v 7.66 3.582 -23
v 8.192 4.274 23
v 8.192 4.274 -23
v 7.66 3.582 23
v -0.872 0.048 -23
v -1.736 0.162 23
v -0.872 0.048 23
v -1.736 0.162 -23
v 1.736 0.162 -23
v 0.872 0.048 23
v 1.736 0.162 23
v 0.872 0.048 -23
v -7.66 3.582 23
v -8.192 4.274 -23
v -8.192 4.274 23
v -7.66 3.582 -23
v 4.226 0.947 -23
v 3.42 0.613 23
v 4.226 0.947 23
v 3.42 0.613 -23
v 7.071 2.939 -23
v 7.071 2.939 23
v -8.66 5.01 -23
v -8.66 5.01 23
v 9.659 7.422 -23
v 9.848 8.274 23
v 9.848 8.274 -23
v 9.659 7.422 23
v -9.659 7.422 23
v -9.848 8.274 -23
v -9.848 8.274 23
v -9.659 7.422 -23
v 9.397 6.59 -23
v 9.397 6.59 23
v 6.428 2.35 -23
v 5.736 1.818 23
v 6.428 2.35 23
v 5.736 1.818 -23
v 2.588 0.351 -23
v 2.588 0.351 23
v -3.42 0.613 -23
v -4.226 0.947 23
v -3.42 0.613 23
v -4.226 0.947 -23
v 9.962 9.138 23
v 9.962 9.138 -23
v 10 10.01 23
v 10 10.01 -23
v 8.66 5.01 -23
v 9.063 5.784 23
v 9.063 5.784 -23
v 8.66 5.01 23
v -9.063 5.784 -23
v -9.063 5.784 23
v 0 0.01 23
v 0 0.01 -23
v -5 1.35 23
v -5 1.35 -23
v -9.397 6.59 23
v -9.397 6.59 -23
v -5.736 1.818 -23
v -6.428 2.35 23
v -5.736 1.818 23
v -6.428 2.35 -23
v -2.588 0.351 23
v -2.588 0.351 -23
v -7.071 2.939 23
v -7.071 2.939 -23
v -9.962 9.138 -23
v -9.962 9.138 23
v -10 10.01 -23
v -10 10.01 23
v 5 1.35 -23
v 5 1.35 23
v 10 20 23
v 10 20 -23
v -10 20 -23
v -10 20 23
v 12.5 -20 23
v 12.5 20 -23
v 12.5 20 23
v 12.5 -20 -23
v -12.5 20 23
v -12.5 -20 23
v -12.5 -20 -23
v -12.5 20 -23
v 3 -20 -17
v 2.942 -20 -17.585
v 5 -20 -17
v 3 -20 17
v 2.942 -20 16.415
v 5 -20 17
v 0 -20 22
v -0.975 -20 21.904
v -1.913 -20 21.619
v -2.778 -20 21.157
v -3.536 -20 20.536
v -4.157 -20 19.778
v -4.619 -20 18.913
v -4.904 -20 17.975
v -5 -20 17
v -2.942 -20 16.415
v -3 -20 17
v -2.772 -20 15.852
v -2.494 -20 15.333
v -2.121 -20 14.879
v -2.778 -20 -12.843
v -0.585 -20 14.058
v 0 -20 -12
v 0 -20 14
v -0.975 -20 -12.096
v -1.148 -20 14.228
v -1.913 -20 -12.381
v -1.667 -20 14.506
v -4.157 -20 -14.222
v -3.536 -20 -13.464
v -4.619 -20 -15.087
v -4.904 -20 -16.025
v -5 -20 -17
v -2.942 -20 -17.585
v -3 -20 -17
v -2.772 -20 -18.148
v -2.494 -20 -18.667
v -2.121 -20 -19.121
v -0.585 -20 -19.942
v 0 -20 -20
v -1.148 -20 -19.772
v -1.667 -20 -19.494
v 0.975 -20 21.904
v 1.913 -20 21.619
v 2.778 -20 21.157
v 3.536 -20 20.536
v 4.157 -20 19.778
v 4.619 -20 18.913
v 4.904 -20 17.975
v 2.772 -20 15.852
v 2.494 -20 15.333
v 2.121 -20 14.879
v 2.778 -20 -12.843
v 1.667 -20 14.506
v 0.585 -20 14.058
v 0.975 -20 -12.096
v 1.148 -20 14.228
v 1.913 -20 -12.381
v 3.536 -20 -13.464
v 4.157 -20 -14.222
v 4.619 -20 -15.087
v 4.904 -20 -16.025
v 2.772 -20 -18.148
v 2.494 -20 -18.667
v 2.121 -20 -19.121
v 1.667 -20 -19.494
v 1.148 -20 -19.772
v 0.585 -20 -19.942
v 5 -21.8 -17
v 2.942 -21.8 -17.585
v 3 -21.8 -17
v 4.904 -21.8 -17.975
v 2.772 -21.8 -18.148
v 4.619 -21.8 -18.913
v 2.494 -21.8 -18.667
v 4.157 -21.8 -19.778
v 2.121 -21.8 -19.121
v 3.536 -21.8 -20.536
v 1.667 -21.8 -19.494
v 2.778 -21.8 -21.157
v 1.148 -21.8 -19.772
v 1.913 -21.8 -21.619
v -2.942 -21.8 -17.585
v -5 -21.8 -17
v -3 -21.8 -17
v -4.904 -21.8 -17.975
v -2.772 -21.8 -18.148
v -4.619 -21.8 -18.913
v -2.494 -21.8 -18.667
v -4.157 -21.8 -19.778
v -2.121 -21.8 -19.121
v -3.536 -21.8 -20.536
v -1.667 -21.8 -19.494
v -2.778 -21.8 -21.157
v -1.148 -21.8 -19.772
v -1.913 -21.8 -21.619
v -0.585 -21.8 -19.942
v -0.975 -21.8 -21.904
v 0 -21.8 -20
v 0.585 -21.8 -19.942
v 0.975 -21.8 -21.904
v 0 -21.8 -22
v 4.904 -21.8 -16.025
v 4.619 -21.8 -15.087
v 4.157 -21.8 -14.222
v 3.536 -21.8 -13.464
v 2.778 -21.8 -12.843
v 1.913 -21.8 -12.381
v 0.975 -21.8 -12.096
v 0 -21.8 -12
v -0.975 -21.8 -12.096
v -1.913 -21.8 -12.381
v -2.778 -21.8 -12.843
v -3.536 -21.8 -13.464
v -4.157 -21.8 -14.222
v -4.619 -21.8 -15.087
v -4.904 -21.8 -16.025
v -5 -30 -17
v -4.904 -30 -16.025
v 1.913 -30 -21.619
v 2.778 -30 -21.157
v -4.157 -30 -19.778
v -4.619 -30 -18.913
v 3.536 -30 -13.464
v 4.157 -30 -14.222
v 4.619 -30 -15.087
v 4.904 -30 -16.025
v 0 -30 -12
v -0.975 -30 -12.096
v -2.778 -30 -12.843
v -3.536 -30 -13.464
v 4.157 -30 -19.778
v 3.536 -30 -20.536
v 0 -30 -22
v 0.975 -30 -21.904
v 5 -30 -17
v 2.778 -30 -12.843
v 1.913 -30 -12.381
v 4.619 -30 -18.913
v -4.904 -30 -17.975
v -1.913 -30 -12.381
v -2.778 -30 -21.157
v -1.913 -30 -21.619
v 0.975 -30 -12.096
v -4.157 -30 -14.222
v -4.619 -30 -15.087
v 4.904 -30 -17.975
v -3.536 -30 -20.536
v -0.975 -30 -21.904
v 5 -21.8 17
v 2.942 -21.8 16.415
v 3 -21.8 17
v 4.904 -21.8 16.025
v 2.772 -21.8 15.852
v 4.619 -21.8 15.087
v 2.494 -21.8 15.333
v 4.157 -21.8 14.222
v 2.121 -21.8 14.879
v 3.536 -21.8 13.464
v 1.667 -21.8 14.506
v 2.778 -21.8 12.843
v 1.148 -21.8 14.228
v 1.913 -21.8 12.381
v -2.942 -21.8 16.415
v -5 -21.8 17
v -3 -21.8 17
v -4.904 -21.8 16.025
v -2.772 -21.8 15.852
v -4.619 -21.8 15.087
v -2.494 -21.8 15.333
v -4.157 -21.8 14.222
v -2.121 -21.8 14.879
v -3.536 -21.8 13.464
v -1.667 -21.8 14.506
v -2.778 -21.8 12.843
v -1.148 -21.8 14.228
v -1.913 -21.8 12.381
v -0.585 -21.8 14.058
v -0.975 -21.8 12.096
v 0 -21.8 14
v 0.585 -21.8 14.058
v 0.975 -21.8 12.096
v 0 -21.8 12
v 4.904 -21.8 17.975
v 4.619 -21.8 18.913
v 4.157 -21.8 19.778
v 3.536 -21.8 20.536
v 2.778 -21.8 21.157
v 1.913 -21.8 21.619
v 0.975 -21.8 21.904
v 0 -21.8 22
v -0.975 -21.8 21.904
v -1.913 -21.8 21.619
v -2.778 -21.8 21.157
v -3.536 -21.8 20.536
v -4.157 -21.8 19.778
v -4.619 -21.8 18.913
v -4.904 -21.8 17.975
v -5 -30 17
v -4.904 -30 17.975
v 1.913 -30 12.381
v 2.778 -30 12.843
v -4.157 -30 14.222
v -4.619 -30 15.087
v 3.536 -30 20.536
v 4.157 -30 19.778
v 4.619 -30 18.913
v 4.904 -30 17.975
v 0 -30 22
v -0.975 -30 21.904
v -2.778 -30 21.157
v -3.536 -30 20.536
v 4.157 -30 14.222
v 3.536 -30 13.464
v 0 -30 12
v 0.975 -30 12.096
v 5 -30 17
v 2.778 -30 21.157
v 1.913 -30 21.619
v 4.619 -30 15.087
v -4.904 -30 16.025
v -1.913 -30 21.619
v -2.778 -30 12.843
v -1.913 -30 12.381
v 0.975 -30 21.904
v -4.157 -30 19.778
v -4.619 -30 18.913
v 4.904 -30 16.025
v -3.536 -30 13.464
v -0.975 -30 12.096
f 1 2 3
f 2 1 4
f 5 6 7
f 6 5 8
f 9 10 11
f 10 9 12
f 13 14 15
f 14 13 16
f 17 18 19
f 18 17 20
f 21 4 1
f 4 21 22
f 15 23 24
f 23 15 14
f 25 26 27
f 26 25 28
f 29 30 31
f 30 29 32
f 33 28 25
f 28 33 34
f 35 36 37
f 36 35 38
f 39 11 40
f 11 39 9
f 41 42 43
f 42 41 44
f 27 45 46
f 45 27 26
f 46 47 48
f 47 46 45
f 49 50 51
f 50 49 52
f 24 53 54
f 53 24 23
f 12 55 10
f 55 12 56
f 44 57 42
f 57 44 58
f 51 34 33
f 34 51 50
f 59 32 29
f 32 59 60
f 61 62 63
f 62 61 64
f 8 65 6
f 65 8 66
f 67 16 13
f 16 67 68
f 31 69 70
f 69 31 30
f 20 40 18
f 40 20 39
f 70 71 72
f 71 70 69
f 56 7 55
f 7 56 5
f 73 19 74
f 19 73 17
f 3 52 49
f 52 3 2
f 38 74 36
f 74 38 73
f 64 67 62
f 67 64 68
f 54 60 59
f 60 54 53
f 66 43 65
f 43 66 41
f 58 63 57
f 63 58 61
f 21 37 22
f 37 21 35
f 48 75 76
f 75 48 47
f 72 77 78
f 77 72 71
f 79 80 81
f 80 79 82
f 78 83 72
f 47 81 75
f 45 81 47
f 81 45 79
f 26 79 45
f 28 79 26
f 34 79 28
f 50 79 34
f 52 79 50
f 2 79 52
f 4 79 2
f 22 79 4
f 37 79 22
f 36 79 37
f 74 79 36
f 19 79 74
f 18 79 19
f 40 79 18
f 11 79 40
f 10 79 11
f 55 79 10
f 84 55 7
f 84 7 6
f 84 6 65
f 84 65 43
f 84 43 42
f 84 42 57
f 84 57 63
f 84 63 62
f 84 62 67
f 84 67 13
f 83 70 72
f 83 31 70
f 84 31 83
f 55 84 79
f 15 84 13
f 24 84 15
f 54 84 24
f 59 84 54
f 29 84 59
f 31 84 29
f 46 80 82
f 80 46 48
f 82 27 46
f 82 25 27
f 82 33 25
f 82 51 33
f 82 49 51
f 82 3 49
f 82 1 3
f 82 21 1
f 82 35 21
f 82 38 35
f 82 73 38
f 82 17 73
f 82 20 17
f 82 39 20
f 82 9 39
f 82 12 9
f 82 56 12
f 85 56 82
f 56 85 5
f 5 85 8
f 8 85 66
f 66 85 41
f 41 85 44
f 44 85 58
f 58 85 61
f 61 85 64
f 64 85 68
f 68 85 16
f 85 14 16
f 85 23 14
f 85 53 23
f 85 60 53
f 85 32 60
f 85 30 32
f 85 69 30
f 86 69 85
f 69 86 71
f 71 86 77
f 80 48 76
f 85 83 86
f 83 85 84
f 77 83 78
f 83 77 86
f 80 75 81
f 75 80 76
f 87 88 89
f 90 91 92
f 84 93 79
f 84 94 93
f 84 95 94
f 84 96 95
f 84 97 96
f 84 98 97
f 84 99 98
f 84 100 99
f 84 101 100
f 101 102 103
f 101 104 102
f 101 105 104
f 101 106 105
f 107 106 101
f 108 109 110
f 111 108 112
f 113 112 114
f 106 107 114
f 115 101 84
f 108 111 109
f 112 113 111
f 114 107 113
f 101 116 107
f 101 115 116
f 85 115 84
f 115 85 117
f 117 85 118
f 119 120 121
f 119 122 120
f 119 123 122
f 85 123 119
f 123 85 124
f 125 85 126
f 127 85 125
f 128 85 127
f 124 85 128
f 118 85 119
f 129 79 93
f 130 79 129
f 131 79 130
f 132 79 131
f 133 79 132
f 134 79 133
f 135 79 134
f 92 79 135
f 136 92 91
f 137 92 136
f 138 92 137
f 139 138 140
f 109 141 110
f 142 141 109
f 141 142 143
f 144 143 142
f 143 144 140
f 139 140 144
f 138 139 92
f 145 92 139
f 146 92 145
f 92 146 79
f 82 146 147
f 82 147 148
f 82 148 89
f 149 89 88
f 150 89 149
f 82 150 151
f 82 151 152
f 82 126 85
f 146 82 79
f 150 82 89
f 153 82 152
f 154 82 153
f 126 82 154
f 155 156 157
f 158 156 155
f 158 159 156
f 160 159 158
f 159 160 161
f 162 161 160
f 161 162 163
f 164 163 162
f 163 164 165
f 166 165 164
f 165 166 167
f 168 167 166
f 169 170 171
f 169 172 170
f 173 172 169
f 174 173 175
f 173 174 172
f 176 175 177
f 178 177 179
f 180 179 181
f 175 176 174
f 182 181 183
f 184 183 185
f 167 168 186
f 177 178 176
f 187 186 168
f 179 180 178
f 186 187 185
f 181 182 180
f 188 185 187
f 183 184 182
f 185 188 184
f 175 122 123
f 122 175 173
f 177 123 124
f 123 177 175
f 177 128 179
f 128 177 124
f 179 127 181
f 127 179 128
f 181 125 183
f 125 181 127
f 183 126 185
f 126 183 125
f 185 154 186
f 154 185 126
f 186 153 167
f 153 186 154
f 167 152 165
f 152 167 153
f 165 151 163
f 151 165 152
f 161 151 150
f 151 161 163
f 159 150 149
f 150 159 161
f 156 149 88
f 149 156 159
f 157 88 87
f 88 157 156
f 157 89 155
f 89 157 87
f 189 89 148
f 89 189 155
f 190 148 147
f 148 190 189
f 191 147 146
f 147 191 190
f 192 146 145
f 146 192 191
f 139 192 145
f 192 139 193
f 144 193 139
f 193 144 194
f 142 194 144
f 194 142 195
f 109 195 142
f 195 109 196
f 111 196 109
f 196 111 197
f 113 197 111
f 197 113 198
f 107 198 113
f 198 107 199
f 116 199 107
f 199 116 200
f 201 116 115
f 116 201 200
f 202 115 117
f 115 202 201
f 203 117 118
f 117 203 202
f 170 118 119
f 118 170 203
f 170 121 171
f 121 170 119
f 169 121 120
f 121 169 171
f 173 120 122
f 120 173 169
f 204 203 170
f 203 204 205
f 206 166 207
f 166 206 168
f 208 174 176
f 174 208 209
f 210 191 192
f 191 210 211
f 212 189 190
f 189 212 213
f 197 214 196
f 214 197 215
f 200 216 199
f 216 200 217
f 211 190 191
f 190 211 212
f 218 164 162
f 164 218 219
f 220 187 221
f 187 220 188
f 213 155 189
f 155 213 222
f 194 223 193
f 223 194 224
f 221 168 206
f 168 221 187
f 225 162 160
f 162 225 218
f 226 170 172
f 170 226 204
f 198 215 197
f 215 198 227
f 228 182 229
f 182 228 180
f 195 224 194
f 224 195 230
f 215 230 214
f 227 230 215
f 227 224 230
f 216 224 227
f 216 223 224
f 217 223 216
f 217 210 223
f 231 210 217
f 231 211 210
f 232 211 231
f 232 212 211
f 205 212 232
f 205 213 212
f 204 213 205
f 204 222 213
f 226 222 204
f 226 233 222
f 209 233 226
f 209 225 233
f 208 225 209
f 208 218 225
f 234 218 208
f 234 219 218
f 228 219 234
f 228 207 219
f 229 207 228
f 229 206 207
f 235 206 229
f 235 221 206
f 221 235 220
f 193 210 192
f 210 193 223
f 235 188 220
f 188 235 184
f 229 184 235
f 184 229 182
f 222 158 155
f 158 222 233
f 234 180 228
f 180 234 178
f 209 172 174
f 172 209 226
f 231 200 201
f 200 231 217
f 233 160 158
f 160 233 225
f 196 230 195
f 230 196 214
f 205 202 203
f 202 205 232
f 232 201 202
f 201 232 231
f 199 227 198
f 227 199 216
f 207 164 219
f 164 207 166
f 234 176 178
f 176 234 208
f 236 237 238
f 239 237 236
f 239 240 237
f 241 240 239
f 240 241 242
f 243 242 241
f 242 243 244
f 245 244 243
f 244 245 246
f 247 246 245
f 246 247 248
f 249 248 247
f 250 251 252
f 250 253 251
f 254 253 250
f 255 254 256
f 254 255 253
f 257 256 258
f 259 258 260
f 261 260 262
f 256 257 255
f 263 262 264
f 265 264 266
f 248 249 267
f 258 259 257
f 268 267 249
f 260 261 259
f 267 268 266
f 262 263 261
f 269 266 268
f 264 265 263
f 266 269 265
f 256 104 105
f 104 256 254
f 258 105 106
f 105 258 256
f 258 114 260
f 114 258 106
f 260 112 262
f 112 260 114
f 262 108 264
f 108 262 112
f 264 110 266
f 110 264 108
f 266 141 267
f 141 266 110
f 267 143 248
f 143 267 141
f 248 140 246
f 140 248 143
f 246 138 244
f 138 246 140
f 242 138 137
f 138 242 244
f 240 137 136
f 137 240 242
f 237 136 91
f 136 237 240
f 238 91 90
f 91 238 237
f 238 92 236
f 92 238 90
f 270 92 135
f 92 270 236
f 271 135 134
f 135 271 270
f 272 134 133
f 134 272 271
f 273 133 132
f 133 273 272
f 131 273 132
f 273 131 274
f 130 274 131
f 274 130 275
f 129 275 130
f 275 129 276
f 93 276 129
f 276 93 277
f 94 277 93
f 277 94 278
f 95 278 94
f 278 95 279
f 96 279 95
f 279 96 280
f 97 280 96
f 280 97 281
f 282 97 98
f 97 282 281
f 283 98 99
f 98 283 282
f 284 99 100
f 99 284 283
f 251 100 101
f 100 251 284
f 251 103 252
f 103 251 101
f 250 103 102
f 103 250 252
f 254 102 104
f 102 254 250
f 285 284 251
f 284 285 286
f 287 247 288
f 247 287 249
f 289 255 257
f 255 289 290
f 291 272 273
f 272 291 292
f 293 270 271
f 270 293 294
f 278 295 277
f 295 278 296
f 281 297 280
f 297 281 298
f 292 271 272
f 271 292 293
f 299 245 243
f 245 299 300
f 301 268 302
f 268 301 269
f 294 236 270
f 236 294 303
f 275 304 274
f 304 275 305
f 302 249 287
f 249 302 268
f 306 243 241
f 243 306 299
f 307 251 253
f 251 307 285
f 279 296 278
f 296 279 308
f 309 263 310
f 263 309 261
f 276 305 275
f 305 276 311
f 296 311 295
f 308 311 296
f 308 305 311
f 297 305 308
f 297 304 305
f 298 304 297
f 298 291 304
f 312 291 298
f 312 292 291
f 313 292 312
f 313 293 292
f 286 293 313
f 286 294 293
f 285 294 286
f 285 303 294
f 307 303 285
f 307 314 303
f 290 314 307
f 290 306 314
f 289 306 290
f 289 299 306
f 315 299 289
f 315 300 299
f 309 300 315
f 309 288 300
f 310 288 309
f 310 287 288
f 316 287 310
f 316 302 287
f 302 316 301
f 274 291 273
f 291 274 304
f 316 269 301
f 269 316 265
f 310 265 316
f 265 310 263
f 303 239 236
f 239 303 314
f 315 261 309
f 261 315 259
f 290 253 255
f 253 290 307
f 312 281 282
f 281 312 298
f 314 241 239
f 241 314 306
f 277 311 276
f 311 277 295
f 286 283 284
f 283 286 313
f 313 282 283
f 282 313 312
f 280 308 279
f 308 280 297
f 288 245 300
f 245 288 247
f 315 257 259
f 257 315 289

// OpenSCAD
// file: ../peg-base-plates/peg-base-plates.scad
// Metal peg board base plate reconstructed from exported 3MF models.
//
// Customizer surface:
// - columns
// - rows
// - plateThickness
//
// Reuse from another file with:
// use <peg-base-plates.scad>
// pegBasePlate(columnCount = 2, rowCount = 2, boardThickness = 2);

/* [Plate] */

// Number of peg columns.
columns = 4; // [1:1:8]

// Number of peg rows.
rows = 2; // [1:1:6]

// Thickness of the plate body in millimeters.
plateThickness = 2; // [1:0.1:5]

/* [Hidden] */

pegDiameter = 10;
notchDiameter = 6;
pegLength = 10;
notchHeight = 1.8;

columnPitch = 22;
rowPitch = 34;

pegSegments = 32;
plateSingleSpan = 14;
plateEdgeMargin = 6;
plateTwoRowHeight = 46;

function plateWidth(columnCount) = columnCount == 1 ? plateSingleSpan : (columnCount - 1) * columnPitch + plateEdgeMargin * 2;
function plateHeight(rowCount) = rowCount == 1 ? plateSingleSpan : rowCount == 2 ? plateTwoRowHeight : rowCount * rowPitch - 18;

function columnCenter(columnIndex, columnCount) = (columnIndex - (columnCount - 1) / 2) * columnPitch;
function rowCenter(rowIndex, rowCount) = (rowIndex - (rowCount - 1) / 2) * rowPitch;

// Peg profile measured from the exported model.
// The small keyed notch near the plate lets the peg flex during insertion.
module pegNotchProfile() {
    union() {
        intersection() {
            circle(d = pegDiameter, $fn = pegSegments);
            translate([-pegDiameter / 2, 0])
                square([pegDiameter, pegDiameter / 2]);
        }

        intersection() {
            circle(d = notchDiameter, $fn = pegSegments);
            translate([-notchDiameter / 2, -notchDiameter / 2])
                square([notchDiameter, notchDiameter / 2]);
        }
    }
}

// Single peg with a short keyed notch at the plate end.
module peg() {
    rotate([90, 0, 0])
        linear_extrude(height = notchHeight)
            pegNotchProfile();

    translate([0, -notchHeight, 0])
        rotate([90, 0, 0])
            cylinder(h = pegLength - notchHeight, d = pegDiameter, $fn = pegSegments);
}

// Reusable plate module.
// columnCount: number of peg columns.
// rowCount: number of peg rows.
// boardThickness: thickness of the rectangular plate body.
module pegBasePlate(columnCount = columns, rowCount = rows, boardThickness = plateThickness) {
    boardWidth = plateWidth(columnCount);
    boardHeight = plateHeight(rowCount);

    union() {
        cube([boardWidth, boardThickness, boardHeight], center = true);

        for (rowIndex = [0 : rowCount - 1]) {
            for (columnIndex = [0 : columnCount - 1]) {
                translate([
                    columnCenter(columnIndex, columnCount),
                    -boardThickness / 2,
                    rowCenter(rowIndex, rowCount)
                ])
                    peg();
            }
        }
    }
}

// Standalone render using the current customizer values.
pegBasePlate();
// file: long-pole-holder-shelf.scad
// Metal peg board long pole holder shelf insert.
//
// Procedural reconstruction that does not depend on external mesh imports.

/* [Shelf] */

// Barrel diameter profile in millimeters.
barrelDiameterMm = 20; // [20:5:30]

// Shelf depth in millimeters.
shelfDepthMm = 60; // [60:1:95]

/* [Hidden] */

shelfWidth = 80;
shelfThickness = 13;
shelfRailInset = 9;
shelfRailDepth = 2;

module longPoleHolderShelf(diameter = barrelDiameterMm, depth = shelfDepthMm) {
    if (!(diameter == 20 || diameter == 25 || diameter == 30)) {
        echo("Unsupported shelf diameter", diameter);
    } else if (!(depth == 60 || depth == 95)) {
        echo("Unsupported shelf depth", depth);
    } else {
        difference() {
            cube([shelfWidth, shelfThickness, depth]);

            // Center relief creates two side rails that lock into the holder body.
            translate([shelfRailInset, 0, 0])
                cube([shelfWidth - shelfRailInset * 2, shelfRailDepth, depth]);

            // Diameter-based center clearance keeps the shelf from interfering
            // with the cradle opening on larger pole sizes.
            translate([shelfWidth / 2, shelfThickness - 0.01, depth / 2])
                rotate([90, 0, 0])
                    cylinder(h = shelfThickness / 2, d = diameter * 0.8, $fn = 48);
        }
    }
}

longPoleHolderShelf();
// file: long-pole-holder.scad
// Metal peg board long pole holder.
//
// Procedural reconstruction that does not depend on external mesh imports.

use <../peg-base-plates/peg-base-plates.scad>

/* [Holder] */

// Barrel diameter profile in millimeters.
barrelDiameterMm = 20; // [20:5:30]

// Holder spacing in millimeters.
spacingMm = 20; // [10:1:95]

// Enable magnetic holder variant where available.
useMagneticHolder = false;

// Only used for the 20mm, 10mm-spacing holder variant.
useShortHolder = false;

/* [Hidden] */

holderHeightDefault = 46;
holderHeightMagnetic = 40;
holderFn = 72;

magnetDiameter = 12;
magnetDepth = 3;
magnetPushoutDiameter = 3;

function holderWidth(diameter) = diameter * 1.25;
function holderDepth(diameter, spacing) = diameter + spacing;
function pegColumnCount(diameter) = diameter >= 30 ? 2 : 1;
function pegCenterX(columnIndex, diameter) = pegColumnCount(diameter) == 1 ? 0 : (columnIndex == 0 ? -11 : 11);
function pegCenterZ(rowIndex) = rowIndex == 0 ? -17 : 17;

module cradleCut(diameter, depth, height) {
    translate([0, depth / 2 - diameter / 2 + 0.01, 0]) {
        cylinder(h = height + 0.2, d = diameter, center = true, $fn = holderFn);

        // Open the lower half of the circular cut to create the front cradle mouth.
        translate([0, diameter / 4, 0])
            cube([diameter, diameter / 2, height + 0.2], center = true);
    }
}

module magneticHoles(depth, height) {
    magRadius = magnetDiameter / 2;
    stepSize = magRadius + 1;

    for (i = [0 : stepSize : height - magRadius * 3]) {
        offsetDirection = floor(i / stepSize) % 2 == 1 ? -1 : 1;

        translate([
            offsetDirection * magRadius,
            -(depth / 2 - magnetDepth / 2),
            i - (height / 2 - stepSize)
        ])
            rotate([90, 0, 0]) {
                cylinder(h = magnetDepth, r = magRadius, center = true, $fn = holderFn);

                // Push-through hole to recover press-fit magnets.
                translate([0, 0, -depth / 2])
                    cylinder(h = depth, d = magnetPushoutDiameter, center = true, $fn = holderFn / 2);
            }
    }
}

module backPegs(depth, diameter) {
    for (rowIndex = [0 : 1]) {
        for (columnIndex = [0 : pegColumnCount(diameter) - 1]) {
            translate([
                pegCenterX(columnIndex, diameter),
                -depth / 2,
                pegCenterZ(rowIndex)
            ])
                peg();
        }
    }
}

module longPoleHolder(diameter = barrelDiameterMm, spacing = spacingMm, magnetic = useMagneticHolder, shortHolder = useShortHolder) {
    if (!(diameter == 20 || diameter == 25 || diameter == 30)) {
        echo("Unsupported holder diameter", diameter);
    } else if (magnetic && !(diameter == 20 && spacing == 20)) {
        echo("Unsupported magnetic holder combination", diameter, spacing);
    } else if (!magnetic && diameter != 20 && spacing == 10) {
        echo("Unsupported non-magnetic holder combination", diameter, spacing);
    } else {
        width = holderWidth(diameter);
        depth = holderDepth(diameter, spacing);
        height = magnetic ? holderHeightMagnetic : holderHeightDefault;

        // Keep the short variant selectable for compatibility with existing presets.
        shortOffset = shortHolder ? 0 : 0;

        union() {
            difference() {
                translate([0, shortOffset, 0])
                    cube([width, depth, height], center = true);

                translate([0, shortOffset, 0])
                    cradleCut(diameter, depth, height);

                if (magnetic)
                    translate([0, shortOffset, 0])
                        magneticHoles(depth, height);
            }

            if (!magnetic)
                translate([0, shortOffset, 0])
                    backPegs(depth, diameter);
        }
    }
}

longPoleHolder();
// main file
// Metal peg board long pole holder accessory.
//
// Unified entrypoint that routes to procedural holder and shelf models.

use <long-pole-holder.scad>
use <long-pole-holder-shelf.scad>

/* [Accessory] */

// 0 = Holder, 1 = Shelf, 2 = Magnetic Holder
accessoryType = 0; // [0:1:2]

// Barrel diameter profile in millimeters.
barrelDiameterMm = 20; // [20:5:30]

// Holder spacing in millimeters (holder variants only).
spacingMm = 20; // [10:1:95]

// Shelf depth in millimeters (shelf variants only).
shelfDepthMm = 60; // [60:1:95]

// Only used for the 20mm, 10mm-spacing holder variant.
useShortHolder = false;

/* [Hidden] */

module longPoleHolderAccessory(
    type = accessoryType,
    diameter = barrelDiameterMm,
    spacing = spacingMm,
    depth = shelfDepthMm,
    shortHolder = useShortHolder
) {
    if (type == 0)
        longPoleHolder(diameter = diameter, spacing = spacing, magnetic = false, shortHolder = shortHolder);
    else if (type == 1)
        longPoleHolderShelf(diameter = diameter, depth = depth);
    else if (type == 2)
        longPoleHolder(diameter = diameter, spacing = spacing, magnetic = true, shortHolder = false);
    else
        echo("Unsupported accessory type", type);
}

longPoleHolderAccessory();
